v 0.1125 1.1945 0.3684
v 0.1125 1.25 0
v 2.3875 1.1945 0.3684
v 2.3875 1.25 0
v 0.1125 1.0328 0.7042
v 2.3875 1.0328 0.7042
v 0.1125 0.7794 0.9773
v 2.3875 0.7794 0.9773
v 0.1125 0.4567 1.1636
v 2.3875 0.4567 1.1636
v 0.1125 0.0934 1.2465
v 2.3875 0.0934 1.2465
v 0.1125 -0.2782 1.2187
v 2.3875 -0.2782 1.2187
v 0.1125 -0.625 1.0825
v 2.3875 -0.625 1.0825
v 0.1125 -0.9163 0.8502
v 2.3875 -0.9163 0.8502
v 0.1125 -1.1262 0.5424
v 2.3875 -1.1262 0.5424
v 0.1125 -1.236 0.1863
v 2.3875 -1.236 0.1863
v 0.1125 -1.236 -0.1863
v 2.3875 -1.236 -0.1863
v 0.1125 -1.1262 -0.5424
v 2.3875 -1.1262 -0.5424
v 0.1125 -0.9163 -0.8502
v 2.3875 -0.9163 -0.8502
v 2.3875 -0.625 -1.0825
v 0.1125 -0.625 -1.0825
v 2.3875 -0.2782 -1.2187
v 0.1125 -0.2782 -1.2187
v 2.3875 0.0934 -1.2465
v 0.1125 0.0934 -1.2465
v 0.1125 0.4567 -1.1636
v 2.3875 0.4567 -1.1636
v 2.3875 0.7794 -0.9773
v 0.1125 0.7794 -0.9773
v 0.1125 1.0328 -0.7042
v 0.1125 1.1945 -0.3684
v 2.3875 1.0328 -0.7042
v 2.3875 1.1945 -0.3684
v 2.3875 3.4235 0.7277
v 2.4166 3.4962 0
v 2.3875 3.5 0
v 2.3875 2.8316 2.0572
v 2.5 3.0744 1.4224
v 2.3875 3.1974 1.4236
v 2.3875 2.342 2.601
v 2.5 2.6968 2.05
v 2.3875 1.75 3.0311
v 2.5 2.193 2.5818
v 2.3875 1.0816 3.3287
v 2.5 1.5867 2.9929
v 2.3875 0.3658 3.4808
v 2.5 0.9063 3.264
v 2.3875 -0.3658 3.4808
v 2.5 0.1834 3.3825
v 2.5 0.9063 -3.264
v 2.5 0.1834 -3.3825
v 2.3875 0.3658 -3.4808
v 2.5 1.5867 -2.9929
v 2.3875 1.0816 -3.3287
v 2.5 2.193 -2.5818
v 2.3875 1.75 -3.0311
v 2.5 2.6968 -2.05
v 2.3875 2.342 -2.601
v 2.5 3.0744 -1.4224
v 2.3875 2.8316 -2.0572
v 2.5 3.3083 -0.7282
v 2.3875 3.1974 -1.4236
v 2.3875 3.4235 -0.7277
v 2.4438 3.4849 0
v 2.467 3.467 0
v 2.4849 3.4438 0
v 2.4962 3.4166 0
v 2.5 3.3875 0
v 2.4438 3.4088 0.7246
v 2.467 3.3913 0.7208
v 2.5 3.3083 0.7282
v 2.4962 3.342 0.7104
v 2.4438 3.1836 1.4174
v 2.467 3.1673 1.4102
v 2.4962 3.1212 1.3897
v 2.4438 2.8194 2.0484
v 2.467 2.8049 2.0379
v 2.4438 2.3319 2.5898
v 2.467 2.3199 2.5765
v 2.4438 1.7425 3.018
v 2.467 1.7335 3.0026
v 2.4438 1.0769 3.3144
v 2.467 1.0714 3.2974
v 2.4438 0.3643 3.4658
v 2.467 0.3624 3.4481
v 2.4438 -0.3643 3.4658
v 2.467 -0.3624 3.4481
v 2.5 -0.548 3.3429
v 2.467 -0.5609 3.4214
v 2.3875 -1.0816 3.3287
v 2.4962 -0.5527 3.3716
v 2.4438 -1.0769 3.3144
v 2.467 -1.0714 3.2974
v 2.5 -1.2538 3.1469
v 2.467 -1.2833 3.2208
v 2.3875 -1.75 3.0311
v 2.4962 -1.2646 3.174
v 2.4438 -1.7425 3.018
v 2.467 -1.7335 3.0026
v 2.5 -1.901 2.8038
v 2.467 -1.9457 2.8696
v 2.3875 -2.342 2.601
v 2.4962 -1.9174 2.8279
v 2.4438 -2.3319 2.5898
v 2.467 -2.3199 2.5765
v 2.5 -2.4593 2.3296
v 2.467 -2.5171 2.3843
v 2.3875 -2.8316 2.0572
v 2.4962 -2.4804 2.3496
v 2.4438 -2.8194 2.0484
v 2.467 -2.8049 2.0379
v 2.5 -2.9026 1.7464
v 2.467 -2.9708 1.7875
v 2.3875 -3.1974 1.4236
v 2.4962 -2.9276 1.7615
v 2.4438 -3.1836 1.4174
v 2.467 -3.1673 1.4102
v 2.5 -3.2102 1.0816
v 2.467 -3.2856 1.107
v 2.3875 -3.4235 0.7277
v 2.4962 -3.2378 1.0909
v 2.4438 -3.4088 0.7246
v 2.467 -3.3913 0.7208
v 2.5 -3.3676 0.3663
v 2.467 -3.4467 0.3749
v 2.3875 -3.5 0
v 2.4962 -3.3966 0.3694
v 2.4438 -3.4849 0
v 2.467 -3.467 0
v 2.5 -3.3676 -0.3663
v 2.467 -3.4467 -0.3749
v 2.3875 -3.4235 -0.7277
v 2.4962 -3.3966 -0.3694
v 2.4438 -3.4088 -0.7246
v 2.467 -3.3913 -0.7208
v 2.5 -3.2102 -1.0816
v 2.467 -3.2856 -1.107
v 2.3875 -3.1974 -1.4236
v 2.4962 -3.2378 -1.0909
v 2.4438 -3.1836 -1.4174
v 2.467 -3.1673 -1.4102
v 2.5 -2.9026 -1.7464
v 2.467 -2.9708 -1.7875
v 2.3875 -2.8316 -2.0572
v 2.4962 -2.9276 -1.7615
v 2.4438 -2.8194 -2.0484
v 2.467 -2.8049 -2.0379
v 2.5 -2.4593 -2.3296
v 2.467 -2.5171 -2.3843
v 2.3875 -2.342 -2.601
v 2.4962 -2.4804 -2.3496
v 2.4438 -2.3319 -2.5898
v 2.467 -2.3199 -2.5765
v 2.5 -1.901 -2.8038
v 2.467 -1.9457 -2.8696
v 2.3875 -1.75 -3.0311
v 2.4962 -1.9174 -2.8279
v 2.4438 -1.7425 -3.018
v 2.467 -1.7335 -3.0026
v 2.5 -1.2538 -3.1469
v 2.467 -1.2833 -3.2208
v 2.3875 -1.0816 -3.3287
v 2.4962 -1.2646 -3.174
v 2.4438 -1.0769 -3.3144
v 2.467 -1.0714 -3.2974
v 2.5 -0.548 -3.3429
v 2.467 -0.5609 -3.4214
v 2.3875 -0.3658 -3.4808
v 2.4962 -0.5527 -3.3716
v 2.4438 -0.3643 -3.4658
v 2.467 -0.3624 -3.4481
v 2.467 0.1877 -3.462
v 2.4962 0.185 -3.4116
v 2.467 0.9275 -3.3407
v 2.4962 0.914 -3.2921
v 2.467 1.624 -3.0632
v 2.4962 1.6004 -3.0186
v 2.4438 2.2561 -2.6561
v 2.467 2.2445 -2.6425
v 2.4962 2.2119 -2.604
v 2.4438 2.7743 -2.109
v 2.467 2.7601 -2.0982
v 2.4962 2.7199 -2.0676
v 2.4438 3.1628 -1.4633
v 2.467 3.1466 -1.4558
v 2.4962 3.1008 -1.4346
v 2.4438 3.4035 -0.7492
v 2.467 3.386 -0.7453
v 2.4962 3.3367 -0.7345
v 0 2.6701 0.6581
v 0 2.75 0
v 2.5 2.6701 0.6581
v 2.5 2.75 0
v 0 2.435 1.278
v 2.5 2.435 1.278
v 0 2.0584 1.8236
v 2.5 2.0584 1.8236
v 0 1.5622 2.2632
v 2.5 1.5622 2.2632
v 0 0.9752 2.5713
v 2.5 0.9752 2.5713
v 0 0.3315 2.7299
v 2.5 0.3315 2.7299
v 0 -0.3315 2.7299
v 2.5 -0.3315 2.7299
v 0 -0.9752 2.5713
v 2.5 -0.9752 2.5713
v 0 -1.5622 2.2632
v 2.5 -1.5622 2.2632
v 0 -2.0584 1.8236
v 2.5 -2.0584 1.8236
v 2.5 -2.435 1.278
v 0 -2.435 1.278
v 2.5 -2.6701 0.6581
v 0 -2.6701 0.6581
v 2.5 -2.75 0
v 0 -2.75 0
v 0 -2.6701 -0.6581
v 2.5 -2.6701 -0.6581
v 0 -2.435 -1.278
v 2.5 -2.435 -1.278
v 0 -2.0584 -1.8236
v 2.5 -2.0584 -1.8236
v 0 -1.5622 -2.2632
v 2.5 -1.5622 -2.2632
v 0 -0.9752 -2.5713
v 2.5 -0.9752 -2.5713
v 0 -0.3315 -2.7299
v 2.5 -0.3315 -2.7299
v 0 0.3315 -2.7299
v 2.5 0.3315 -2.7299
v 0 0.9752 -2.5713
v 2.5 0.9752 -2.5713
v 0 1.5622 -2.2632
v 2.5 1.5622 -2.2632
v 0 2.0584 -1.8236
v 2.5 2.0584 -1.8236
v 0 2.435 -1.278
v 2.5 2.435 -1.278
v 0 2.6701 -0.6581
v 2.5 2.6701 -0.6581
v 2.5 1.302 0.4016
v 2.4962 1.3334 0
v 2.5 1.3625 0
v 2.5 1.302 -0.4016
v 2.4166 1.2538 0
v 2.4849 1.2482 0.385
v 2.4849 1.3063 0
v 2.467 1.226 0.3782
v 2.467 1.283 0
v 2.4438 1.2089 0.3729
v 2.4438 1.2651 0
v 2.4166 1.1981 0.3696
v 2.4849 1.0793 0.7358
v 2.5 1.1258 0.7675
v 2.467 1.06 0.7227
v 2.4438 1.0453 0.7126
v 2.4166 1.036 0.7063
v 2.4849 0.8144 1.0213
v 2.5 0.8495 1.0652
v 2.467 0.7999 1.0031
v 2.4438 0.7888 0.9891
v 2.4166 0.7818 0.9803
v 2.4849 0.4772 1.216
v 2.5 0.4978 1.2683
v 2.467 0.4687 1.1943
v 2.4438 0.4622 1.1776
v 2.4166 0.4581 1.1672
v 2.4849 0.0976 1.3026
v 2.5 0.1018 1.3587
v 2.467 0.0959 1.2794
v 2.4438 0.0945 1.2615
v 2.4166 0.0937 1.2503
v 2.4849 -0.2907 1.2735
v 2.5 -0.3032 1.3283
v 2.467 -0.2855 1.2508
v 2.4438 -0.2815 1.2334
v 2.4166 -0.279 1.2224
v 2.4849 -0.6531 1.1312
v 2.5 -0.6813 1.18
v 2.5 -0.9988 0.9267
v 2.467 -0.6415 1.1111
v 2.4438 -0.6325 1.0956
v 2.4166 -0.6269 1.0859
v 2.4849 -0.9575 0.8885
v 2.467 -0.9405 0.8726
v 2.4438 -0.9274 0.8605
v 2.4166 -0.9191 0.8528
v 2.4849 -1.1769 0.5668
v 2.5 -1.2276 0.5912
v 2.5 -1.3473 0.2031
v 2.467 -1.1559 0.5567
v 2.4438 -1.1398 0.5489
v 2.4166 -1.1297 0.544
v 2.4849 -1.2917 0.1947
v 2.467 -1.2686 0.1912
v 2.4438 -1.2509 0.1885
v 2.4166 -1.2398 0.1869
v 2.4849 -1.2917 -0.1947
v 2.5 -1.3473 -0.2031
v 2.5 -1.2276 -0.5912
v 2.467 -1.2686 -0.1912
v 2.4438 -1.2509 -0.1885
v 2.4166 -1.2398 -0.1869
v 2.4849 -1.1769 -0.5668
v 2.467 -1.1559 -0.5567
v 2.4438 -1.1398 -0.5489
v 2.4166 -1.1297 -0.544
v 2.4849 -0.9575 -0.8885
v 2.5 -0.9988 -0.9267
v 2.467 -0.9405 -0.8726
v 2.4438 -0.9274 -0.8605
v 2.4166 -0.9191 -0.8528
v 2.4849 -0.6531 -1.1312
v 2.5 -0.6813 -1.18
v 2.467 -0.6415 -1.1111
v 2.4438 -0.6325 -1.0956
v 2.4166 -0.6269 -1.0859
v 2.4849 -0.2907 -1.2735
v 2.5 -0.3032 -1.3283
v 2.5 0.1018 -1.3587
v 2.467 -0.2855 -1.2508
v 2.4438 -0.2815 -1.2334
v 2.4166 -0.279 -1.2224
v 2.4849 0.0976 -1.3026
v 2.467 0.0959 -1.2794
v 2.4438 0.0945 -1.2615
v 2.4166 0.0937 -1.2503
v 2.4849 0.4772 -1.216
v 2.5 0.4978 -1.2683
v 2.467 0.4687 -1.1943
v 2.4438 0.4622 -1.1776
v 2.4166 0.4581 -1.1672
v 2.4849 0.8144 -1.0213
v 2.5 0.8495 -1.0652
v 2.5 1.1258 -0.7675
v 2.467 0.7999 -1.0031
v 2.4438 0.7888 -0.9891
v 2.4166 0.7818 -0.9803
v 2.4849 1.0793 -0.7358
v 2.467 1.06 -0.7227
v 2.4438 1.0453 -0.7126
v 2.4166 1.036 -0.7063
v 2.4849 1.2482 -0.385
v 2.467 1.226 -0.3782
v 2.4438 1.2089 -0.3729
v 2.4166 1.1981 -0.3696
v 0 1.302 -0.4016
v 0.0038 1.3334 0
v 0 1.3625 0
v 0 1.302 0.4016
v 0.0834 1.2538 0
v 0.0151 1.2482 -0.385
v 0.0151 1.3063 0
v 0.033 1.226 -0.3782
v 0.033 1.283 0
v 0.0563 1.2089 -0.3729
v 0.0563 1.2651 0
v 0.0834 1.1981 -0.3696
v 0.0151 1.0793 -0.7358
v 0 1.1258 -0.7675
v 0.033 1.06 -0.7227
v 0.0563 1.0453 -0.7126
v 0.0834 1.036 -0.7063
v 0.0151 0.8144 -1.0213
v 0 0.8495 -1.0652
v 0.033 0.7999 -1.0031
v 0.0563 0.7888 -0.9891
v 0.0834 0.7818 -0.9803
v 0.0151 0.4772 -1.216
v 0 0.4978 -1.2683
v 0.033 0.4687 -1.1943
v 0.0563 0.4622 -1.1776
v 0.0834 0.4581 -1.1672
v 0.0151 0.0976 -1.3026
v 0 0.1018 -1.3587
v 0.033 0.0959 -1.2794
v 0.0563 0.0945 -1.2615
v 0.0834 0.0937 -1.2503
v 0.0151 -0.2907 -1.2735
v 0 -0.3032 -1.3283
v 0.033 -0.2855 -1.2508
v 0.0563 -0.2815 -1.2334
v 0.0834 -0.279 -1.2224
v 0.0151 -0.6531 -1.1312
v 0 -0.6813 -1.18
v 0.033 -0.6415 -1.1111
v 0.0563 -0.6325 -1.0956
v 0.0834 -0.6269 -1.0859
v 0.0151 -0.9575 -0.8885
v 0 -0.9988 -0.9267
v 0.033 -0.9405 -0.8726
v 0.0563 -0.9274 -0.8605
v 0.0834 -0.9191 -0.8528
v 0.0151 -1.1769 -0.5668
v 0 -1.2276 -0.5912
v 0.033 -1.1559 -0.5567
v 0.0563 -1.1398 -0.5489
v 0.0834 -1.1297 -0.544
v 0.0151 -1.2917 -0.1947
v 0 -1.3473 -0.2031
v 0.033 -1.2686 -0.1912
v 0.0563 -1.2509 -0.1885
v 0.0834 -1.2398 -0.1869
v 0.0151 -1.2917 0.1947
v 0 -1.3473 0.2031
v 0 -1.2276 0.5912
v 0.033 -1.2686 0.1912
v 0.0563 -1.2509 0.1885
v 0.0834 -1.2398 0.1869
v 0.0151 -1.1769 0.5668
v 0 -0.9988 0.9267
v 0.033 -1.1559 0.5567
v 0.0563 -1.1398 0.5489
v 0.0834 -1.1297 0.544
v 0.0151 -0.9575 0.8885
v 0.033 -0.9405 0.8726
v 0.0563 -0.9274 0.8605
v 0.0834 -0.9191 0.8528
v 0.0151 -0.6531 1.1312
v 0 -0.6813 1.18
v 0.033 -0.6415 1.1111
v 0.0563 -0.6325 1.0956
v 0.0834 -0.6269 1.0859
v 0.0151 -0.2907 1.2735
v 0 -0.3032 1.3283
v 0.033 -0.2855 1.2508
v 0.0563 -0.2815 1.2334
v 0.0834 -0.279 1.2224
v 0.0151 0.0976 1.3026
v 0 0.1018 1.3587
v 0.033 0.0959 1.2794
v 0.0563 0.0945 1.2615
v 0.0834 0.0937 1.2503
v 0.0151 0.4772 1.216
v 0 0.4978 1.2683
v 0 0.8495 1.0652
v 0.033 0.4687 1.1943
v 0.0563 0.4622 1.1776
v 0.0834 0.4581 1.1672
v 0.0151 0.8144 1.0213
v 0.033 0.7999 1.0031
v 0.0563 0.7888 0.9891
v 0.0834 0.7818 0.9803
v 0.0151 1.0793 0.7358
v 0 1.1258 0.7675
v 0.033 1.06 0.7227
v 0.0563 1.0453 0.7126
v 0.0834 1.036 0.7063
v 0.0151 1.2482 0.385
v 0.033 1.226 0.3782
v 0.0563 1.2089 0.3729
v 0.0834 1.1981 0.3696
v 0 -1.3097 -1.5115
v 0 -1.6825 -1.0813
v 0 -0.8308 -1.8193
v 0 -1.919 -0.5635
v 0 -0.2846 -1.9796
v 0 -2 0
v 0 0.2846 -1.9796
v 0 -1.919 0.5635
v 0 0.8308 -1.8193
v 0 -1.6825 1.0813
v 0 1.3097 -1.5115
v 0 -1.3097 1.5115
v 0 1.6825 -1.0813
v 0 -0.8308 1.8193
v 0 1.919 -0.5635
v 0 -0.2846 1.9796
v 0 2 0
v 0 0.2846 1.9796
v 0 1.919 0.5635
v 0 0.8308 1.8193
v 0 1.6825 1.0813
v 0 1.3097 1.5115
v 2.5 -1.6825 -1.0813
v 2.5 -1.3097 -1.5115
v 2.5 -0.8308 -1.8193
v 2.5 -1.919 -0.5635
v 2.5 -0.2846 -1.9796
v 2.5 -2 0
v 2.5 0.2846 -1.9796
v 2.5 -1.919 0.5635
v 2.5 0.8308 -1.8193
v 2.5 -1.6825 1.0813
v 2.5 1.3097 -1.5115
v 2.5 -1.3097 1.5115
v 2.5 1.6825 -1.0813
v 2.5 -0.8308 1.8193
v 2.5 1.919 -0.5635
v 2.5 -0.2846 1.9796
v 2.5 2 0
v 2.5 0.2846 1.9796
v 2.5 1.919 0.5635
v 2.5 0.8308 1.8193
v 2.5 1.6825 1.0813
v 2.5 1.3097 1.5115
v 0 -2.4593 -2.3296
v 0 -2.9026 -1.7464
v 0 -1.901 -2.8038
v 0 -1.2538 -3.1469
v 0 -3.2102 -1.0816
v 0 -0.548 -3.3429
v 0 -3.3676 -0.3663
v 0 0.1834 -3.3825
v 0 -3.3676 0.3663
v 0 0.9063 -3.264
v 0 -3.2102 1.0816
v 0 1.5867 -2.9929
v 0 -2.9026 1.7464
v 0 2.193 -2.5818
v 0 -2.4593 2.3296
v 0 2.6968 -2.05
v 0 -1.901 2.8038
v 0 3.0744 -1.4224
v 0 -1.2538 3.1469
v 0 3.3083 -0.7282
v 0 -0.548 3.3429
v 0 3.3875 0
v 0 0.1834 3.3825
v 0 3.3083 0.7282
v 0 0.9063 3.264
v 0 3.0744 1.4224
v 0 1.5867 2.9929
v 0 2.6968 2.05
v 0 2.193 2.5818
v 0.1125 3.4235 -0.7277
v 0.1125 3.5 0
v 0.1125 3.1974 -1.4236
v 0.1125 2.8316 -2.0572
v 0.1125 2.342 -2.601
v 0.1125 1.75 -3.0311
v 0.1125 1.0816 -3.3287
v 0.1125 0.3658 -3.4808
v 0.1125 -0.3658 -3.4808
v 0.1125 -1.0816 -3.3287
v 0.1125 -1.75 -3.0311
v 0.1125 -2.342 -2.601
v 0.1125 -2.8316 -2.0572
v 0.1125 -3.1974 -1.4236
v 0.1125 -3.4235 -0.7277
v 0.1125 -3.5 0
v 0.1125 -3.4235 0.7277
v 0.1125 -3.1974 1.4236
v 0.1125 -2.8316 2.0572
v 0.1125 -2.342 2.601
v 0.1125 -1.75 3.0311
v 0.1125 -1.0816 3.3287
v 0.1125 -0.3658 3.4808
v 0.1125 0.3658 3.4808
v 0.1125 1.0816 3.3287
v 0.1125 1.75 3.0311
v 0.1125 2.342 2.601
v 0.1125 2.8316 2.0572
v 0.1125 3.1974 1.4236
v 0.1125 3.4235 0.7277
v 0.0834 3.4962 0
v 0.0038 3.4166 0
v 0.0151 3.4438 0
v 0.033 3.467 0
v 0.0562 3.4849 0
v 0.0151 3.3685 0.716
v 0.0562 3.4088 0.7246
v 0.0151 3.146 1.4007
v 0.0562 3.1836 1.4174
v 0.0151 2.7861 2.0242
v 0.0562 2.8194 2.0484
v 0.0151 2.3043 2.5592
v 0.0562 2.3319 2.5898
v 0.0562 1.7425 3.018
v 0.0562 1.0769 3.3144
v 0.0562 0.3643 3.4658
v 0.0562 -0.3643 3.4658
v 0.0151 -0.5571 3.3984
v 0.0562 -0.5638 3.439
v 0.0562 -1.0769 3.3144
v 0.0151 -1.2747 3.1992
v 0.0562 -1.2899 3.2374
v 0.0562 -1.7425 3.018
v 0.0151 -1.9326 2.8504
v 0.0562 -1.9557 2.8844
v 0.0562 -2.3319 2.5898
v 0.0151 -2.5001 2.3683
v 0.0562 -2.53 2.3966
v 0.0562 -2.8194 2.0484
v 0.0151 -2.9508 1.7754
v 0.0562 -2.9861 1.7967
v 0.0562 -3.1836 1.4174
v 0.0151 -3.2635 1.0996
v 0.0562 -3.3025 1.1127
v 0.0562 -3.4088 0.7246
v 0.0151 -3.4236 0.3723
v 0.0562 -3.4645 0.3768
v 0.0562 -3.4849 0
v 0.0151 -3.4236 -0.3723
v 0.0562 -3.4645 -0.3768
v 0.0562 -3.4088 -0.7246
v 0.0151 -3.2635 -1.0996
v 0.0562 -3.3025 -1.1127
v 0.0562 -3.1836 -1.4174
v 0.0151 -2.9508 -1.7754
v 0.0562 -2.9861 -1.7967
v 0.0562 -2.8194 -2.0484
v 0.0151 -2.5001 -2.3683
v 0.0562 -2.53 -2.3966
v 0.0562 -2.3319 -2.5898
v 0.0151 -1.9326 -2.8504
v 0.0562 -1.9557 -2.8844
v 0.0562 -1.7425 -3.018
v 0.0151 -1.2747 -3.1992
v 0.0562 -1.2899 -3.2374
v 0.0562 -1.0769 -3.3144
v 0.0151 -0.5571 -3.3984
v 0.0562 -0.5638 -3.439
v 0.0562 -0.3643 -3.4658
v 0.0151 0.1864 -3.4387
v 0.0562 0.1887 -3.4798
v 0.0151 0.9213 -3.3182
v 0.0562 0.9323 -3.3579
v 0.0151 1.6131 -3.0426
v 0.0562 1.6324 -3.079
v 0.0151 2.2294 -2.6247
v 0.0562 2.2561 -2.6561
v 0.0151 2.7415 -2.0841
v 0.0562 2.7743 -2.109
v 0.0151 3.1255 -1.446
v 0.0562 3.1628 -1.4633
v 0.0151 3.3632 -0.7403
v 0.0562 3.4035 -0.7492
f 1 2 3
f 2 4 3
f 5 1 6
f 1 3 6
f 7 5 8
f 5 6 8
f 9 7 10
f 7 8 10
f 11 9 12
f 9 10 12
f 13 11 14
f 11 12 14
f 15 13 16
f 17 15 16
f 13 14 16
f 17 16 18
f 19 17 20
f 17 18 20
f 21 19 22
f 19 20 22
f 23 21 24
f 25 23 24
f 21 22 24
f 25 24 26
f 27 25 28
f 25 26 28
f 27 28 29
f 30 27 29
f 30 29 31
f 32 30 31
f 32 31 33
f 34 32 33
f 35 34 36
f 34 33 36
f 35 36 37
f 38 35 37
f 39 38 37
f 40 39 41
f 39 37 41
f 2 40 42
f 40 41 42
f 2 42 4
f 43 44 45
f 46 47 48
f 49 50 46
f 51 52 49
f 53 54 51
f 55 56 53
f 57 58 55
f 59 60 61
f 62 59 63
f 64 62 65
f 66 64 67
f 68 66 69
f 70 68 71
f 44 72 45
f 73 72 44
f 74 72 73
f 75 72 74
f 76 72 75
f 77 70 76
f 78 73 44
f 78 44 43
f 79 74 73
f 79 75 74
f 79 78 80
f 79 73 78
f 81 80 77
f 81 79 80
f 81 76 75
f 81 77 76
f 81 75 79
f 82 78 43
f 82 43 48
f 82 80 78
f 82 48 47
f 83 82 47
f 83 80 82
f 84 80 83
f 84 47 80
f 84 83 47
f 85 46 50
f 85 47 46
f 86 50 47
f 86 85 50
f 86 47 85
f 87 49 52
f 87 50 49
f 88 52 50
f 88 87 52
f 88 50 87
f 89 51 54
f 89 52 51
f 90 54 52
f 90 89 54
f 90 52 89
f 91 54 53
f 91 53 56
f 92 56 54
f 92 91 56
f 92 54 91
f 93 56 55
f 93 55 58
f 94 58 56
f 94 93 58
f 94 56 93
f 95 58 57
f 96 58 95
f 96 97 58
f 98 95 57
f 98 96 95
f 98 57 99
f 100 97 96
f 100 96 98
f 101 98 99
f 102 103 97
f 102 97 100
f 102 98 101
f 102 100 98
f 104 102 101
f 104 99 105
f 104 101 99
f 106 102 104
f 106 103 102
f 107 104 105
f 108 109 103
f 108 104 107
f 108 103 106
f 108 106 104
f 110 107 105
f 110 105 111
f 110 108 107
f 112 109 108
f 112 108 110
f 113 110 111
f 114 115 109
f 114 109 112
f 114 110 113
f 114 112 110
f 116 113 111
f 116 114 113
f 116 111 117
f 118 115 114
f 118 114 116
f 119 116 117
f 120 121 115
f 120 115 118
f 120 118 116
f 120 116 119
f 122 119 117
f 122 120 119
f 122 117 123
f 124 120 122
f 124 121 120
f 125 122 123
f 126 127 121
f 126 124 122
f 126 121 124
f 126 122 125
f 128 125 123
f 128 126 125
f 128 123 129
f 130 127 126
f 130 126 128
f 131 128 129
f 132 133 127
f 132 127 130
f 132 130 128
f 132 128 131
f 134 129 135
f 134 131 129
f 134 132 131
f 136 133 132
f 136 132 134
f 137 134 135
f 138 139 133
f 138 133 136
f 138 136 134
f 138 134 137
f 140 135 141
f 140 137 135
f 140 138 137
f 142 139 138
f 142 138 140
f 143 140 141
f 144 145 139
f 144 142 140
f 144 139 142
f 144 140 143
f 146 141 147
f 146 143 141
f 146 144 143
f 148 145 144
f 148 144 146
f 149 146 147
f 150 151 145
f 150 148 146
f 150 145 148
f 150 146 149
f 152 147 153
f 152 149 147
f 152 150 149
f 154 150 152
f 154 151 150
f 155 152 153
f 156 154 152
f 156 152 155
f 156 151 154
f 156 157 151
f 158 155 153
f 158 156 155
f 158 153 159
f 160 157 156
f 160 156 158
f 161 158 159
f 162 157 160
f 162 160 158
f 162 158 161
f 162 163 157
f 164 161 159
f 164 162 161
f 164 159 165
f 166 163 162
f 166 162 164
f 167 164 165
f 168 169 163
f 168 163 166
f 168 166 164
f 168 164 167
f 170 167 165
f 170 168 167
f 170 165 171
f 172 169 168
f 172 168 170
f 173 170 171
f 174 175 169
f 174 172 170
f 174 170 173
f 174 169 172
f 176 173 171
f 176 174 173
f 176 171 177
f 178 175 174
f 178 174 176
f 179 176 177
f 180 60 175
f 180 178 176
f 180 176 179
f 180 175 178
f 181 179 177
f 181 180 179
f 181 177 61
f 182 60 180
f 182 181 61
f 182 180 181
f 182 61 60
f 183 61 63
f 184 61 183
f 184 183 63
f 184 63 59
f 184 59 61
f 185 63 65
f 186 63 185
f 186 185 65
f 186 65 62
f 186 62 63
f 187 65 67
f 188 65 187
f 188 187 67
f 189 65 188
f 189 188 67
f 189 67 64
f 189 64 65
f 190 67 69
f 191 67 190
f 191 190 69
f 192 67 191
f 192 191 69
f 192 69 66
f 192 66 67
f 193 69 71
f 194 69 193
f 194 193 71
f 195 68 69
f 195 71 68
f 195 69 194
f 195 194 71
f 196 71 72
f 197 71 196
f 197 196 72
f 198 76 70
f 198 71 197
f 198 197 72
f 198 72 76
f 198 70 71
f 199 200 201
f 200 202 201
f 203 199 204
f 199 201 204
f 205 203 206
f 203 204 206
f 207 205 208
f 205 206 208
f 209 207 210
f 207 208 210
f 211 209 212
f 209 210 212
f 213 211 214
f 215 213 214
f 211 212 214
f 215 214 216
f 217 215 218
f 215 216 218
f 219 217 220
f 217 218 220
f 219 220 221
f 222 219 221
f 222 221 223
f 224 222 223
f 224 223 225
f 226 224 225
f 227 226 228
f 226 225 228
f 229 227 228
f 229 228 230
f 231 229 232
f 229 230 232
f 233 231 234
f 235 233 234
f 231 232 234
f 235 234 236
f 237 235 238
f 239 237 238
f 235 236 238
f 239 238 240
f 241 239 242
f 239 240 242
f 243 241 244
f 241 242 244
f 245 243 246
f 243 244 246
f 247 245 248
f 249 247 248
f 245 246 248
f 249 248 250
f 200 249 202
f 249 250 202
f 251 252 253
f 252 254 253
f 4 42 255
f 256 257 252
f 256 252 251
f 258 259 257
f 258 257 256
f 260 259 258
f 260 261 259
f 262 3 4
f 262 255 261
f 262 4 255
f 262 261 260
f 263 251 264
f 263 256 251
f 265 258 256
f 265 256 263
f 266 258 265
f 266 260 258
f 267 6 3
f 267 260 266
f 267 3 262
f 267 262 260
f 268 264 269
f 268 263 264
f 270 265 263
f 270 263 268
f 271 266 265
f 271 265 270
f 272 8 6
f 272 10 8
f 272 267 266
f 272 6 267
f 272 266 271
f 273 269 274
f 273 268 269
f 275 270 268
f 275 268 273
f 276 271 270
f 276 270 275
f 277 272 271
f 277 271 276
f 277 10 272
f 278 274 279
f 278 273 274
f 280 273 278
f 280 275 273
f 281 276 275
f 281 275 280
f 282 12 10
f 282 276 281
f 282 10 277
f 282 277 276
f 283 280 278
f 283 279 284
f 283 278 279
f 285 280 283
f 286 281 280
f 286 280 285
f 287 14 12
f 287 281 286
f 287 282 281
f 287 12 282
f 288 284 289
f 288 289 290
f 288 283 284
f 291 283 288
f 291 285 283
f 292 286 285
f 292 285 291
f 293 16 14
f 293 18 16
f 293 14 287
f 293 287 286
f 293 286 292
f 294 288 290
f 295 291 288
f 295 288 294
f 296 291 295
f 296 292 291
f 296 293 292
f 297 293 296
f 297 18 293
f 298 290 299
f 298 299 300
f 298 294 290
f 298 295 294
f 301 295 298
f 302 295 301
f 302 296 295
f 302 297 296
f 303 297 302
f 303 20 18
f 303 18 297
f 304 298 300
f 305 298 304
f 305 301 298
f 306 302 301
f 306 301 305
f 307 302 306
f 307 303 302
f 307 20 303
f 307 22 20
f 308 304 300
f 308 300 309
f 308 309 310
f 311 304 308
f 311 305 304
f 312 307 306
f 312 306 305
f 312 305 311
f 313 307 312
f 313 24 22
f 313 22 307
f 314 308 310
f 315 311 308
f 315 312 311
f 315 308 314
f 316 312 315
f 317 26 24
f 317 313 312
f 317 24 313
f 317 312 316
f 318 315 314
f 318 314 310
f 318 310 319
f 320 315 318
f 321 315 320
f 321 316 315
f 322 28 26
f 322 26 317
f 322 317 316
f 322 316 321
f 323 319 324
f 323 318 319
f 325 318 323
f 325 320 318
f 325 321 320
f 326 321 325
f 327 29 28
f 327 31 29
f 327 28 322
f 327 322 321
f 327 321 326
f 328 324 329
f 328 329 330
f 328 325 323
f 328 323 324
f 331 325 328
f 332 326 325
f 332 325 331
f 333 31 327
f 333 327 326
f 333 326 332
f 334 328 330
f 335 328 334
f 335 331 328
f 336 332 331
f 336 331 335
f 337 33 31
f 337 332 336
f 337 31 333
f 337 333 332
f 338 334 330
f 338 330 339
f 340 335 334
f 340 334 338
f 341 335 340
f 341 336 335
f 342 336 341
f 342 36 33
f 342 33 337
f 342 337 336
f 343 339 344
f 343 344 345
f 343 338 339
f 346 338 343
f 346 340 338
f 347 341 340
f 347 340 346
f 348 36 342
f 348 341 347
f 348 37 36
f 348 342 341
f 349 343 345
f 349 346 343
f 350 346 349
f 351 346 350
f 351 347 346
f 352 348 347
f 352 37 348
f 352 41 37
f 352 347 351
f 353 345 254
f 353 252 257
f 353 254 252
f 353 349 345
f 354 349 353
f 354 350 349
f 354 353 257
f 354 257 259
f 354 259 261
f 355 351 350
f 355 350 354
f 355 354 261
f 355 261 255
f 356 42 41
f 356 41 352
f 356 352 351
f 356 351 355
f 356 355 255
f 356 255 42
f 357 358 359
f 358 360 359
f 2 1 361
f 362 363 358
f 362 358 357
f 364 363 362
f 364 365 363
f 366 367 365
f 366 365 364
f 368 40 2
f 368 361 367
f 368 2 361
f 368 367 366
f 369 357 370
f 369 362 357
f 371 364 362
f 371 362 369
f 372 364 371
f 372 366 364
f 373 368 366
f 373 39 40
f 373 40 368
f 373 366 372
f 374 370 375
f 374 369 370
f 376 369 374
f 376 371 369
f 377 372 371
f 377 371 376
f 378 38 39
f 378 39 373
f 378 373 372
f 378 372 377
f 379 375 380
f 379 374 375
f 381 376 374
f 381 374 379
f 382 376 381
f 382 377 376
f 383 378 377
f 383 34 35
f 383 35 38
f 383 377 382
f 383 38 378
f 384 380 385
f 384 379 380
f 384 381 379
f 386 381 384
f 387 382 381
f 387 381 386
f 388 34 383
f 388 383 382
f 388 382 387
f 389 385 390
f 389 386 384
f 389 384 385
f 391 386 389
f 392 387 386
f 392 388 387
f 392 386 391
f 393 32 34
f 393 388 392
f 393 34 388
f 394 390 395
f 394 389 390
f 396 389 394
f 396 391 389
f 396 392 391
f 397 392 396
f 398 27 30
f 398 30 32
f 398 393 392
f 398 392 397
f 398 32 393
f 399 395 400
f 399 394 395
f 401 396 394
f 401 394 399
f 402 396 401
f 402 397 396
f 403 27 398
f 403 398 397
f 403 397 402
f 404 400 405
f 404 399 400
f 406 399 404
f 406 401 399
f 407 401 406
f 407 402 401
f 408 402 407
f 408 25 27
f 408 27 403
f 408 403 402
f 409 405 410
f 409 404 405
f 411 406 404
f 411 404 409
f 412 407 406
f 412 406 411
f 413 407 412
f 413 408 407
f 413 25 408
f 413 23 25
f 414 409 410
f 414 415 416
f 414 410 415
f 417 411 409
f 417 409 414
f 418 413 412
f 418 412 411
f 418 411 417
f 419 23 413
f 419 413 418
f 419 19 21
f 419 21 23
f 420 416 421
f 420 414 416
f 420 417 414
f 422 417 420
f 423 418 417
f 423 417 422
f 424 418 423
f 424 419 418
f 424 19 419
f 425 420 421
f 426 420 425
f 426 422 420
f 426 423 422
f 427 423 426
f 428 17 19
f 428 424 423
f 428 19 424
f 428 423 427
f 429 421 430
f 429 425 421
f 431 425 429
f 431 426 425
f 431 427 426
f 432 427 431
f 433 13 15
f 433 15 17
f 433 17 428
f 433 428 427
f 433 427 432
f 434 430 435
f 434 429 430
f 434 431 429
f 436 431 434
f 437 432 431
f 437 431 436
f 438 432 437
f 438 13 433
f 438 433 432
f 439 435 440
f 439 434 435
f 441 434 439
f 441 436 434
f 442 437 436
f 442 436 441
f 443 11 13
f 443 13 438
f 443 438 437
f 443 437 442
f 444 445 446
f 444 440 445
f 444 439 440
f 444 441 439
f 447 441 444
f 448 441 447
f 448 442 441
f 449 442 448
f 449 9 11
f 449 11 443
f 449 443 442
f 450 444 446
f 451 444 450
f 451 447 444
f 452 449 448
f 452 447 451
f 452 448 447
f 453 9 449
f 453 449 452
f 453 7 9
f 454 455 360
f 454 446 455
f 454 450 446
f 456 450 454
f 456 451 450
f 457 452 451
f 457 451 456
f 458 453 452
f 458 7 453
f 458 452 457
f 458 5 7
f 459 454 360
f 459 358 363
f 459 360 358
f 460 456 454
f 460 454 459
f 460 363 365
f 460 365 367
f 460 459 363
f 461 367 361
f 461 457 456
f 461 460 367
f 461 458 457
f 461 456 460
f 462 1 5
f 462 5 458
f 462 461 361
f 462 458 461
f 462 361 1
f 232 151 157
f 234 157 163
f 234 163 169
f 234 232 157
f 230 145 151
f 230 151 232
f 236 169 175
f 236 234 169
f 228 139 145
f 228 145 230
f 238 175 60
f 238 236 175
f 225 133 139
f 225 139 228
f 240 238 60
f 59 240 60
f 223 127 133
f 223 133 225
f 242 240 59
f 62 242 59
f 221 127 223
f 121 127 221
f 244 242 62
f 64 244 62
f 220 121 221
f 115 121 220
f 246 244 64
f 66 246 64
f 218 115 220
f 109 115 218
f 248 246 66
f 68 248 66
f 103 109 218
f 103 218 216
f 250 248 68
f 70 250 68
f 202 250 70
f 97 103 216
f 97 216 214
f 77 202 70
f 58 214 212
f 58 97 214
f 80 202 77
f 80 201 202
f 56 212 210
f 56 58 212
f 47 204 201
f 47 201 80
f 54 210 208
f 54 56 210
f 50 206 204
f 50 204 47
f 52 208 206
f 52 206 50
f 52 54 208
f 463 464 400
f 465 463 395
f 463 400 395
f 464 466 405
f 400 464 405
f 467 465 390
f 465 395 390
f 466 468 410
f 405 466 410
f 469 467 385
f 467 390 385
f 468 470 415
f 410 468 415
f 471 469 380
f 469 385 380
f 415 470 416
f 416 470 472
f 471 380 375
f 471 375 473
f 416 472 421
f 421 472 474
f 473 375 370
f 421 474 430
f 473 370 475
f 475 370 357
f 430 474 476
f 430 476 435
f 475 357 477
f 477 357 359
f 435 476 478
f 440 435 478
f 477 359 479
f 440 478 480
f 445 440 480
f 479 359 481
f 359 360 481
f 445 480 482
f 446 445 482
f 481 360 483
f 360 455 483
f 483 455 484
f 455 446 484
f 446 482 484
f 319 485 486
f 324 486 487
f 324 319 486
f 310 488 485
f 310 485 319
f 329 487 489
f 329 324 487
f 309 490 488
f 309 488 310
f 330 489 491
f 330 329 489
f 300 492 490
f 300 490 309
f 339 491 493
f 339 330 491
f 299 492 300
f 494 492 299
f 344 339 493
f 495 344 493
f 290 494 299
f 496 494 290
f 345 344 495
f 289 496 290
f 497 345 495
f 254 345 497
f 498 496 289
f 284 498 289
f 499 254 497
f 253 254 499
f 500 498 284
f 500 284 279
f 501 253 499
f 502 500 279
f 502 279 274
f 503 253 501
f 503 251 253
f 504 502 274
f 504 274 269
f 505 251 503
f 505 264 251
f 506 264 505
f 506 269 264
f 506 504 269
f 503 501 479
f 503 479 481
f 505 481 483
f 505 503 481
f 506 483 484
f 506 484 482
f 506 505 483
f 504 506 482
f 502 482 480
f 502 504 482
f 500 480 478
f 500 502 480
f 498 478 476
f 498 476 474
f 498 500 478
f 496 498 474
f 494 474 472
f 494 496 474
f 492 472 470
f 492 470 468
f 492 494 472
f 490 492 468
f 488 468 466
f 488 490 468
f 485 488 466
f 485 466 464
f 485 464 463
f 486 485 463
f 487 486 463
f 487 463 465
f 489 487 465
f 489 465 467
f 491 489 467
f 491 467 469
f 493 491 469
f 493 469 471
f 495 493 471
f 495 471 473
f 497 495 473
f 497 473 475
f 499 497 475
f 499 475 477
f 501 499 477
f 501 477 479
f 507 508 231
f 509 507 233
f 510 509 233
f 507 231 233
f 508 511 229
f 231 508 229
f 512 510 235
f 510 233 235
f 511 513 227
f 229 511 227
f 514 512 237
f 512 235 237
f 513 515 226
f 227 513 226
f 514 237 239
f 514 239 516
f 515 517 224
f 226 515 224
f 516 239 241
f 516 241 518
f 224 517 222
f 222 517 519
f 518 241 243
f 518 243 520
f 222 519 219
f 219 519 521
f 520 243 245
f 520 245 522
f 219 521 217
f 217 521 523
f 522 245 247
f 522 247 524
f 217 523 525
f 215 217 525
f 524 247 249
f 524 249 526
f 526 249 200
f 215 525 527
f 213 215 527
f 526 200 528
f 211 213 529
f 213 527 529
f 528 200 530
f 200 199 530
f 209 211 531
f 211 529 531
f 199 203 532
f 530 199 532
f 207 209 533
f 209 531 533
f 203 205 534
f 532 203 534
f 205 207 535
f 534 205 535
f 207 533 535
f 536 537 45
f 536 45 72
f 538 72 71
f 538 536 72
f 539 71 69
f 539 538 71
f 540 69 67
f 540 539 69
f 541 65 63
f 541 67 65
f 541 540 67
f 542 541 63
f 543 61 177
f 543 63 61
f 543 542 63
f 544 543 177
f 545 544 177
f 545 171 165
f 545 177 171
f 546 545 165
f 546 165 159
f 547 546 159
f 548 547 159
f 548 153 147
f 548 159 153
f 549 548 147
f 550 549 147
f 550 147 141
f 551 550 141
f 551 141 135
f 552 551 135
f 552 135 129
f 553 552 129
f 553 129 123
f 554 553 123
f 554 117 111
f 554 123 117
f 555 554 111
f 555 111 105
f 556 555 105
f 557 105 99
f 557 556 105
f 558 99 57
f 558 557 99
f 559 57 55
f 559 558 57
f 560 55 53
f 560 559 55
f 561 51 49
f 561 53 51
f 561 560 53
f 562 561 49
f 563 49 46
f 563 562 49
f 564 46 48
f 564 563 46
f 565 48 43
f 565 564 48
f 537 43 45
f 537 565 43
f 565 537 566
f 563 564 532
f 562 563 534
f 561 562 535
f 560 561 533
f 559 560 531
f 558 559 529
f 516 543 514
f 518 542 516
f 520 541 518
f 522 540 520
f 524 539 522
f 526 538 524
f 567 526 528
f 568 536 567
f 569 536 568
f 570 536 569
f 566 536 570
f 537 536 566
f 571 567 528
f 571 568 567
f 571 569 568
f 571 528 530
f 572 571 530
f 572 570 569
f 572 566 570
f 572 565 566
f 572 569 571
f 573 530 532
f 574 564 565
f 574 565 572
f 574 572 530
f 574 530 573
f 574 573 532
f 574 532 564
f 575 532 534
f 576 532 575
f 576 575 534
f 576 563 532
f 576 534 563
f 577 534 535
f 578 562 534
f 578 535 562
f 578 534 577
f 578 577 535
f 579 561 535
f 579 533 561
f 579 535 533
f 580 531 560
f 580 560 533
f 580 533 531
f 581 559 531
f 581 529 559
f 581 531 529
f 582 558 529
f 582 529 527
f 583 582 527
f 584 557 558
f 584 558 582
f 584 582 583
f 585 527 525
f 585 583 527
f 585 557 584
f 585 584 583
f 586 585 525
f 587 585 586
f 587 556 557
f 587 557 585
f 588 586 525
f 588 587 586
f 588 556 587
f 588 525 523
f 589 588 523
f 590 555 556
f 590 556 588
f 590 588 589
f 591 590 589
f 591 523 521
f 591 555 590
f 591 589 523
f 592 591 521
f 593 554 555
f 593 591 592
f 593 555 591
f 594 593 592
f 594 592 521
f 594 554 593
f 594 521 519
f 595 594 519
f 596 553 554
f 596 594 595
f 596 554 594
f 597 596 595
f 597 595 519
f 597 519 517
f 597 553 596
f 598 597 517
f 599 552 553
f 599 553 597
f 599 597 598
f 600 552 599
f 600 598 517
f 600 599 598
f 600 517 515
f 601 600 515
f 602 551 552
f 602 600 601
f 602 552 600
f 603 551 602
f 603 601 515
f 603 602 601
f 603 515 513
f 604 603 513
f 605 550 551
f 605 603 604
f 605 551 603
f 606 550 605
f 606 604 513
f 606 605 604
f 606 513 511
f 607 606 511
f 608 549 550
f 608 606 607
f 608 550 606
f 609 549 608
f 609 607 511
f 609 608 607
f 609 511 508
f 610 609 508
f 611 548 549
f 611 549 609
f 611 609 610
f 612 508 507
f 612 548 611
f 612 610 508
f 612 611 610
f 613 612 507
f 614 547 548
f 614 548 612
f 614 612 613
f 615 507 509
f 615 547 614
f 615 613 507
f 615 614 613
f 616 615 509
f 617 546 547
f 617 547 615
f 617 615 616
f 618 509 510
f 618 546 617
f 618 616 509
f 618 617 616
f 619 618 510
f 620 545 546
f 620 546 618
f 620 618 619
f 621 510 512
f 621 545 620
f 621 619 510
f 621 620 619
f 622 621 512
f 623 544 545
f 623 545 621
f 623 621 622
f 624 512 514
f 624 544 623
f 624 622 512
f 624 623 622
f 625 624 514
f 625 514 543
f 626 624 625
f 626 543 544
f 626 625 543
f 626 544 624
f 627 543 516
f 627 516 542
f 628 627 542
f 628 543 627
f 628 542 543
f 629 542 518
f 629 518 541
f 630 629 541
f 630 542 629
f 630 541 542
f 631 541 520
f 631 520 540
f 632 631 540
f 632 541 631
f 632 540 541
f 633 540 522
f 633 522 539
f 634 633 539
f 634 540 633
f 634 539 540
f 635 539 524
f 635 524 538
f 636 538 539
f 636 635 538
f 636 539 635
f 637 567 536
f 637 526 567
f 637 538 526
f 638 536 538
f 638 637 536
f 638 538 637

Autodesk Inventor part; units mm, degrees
ref_plane "YZ Plane" through (0, 0, 0) normal (1, 0, 0) x (0, 1, 0)
ref_plane "XZ Plane" through (0, 0, 0) normal (0, 1, 0) x (-1, 0, 0)
ref_plane "XY Plane" through (0, 0, 0) normal (0, 0, 1) x (1, 0, 0)
sketch "草图" plane through (0, 0, 0) normal (0, 0, 1) x (1, 0, 0)
  line L0 (0, 0) -> (2.5, 0)
  line L1 (0, 0) -> (0, 1.25) construction
  line L2 (0, 1.25) -> (2.5, 1.25)
  line L3 (2.5, 1.25) -> (2.5, 3.5)
  line L4 (2.5, 3.5) -> (0, 3.5)
  line L5 (0, 3.5) -> (0, 1.25)
  line L6 (0, 2.375) -> (2.5, 2.375)
  line L7 (0, 2.75) -> (2.5, 2.75)
  line L8 (0, 2) -> (2.5, 2)
  dimension "d0" = 2.5
  dimension "d1" = 2.5
  dimension "d2" = 4
  dimension "d3" = 7
revolve "轴承体" add sketch "草图" angle 360 about axis through (0, 0, 0) along (1, 0, 0) contours L5 L8 L3 L2 | L5 L4 L3 L7
fillet "圆角1" radius 0.1125 4 edges at (0, -3.5, 0) (2.5, -3.5, 0) (0, -1.25, 0) (2.5, -1.25, 0)
equation "\"d0\" = KB"
equation "\"d1\" = WD"
equation "\"d2\" = 0.333333 * BD + 0.666667 * WD"
equation "\"d3\" = BD"
equation "\"d5\" = -0.025 * WD + 0.025 * BD"
equation "\"WD\" = 2.5"
equation "\"BD\" = 7"
equation "\"KB\" = 2.5"
equation "\"BBA\" = 0"
equation "\"KRS\" = 0.15"
equation "\"KR1S\" = 0.08"
equation "\"BR\" = 0.5 * BD"
equation "\"WR\" = 0.5 * WD"
properties part number "BS 3469 - 19 - 2.5 x 7 x 2.5" material "钢，软"
